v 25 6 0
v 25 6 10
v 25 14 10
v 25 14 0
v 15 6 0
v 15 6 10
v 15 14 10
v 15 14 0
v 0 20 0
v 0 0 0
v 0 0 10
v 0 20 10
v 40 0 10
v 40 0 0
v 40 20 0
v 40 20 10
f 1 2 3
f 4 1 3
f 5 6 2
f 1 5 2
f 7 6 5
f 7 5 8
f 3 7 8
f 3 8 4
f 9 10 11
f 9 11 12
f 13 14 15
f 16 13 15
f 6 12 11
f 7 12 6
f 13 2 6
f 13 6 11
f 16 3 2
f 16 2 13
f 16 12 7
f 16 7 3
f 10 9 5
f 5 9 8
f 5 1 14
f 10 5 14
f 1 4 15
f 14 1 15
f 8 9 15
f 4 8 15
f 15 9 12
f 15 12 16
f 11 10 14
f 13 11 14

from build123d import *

# Parameters (mm, degrees)
RECTANGLESKETCH_W   = 40
RECTANGLESKETCH_H   = 20
BLINDBOSS_DEPTH     = 10
CUTSKETCH_W         = 10
CUTSKETCH_H         = 8
THROUGHALLCUT_DEPTH = 46.82575695


with BuildPart() as part:
    # RectangleSketch → BlindBoss (new body)
    with BuildSketch(Plane.XY):
        with Locations((20, 10)):
            Rectangle(RECTANGLESKETCH_W, RECTANGLESKETCH_H)
    extrude(amount=BLINDBOSS_DEPTH)

    # CutSketch → ThroughAllCut (cut, through all)
    with BuildSketch(Plane.XY.offset(10)):
        with Locations((20, 10)):
            Rectangle(CUTSKETCH_W, CUTSKETCH_H)
    extrude(amount=-THROUGHALLCUT_DEPTH, mode=Mode.SUBTRACT)


solid = part.part
